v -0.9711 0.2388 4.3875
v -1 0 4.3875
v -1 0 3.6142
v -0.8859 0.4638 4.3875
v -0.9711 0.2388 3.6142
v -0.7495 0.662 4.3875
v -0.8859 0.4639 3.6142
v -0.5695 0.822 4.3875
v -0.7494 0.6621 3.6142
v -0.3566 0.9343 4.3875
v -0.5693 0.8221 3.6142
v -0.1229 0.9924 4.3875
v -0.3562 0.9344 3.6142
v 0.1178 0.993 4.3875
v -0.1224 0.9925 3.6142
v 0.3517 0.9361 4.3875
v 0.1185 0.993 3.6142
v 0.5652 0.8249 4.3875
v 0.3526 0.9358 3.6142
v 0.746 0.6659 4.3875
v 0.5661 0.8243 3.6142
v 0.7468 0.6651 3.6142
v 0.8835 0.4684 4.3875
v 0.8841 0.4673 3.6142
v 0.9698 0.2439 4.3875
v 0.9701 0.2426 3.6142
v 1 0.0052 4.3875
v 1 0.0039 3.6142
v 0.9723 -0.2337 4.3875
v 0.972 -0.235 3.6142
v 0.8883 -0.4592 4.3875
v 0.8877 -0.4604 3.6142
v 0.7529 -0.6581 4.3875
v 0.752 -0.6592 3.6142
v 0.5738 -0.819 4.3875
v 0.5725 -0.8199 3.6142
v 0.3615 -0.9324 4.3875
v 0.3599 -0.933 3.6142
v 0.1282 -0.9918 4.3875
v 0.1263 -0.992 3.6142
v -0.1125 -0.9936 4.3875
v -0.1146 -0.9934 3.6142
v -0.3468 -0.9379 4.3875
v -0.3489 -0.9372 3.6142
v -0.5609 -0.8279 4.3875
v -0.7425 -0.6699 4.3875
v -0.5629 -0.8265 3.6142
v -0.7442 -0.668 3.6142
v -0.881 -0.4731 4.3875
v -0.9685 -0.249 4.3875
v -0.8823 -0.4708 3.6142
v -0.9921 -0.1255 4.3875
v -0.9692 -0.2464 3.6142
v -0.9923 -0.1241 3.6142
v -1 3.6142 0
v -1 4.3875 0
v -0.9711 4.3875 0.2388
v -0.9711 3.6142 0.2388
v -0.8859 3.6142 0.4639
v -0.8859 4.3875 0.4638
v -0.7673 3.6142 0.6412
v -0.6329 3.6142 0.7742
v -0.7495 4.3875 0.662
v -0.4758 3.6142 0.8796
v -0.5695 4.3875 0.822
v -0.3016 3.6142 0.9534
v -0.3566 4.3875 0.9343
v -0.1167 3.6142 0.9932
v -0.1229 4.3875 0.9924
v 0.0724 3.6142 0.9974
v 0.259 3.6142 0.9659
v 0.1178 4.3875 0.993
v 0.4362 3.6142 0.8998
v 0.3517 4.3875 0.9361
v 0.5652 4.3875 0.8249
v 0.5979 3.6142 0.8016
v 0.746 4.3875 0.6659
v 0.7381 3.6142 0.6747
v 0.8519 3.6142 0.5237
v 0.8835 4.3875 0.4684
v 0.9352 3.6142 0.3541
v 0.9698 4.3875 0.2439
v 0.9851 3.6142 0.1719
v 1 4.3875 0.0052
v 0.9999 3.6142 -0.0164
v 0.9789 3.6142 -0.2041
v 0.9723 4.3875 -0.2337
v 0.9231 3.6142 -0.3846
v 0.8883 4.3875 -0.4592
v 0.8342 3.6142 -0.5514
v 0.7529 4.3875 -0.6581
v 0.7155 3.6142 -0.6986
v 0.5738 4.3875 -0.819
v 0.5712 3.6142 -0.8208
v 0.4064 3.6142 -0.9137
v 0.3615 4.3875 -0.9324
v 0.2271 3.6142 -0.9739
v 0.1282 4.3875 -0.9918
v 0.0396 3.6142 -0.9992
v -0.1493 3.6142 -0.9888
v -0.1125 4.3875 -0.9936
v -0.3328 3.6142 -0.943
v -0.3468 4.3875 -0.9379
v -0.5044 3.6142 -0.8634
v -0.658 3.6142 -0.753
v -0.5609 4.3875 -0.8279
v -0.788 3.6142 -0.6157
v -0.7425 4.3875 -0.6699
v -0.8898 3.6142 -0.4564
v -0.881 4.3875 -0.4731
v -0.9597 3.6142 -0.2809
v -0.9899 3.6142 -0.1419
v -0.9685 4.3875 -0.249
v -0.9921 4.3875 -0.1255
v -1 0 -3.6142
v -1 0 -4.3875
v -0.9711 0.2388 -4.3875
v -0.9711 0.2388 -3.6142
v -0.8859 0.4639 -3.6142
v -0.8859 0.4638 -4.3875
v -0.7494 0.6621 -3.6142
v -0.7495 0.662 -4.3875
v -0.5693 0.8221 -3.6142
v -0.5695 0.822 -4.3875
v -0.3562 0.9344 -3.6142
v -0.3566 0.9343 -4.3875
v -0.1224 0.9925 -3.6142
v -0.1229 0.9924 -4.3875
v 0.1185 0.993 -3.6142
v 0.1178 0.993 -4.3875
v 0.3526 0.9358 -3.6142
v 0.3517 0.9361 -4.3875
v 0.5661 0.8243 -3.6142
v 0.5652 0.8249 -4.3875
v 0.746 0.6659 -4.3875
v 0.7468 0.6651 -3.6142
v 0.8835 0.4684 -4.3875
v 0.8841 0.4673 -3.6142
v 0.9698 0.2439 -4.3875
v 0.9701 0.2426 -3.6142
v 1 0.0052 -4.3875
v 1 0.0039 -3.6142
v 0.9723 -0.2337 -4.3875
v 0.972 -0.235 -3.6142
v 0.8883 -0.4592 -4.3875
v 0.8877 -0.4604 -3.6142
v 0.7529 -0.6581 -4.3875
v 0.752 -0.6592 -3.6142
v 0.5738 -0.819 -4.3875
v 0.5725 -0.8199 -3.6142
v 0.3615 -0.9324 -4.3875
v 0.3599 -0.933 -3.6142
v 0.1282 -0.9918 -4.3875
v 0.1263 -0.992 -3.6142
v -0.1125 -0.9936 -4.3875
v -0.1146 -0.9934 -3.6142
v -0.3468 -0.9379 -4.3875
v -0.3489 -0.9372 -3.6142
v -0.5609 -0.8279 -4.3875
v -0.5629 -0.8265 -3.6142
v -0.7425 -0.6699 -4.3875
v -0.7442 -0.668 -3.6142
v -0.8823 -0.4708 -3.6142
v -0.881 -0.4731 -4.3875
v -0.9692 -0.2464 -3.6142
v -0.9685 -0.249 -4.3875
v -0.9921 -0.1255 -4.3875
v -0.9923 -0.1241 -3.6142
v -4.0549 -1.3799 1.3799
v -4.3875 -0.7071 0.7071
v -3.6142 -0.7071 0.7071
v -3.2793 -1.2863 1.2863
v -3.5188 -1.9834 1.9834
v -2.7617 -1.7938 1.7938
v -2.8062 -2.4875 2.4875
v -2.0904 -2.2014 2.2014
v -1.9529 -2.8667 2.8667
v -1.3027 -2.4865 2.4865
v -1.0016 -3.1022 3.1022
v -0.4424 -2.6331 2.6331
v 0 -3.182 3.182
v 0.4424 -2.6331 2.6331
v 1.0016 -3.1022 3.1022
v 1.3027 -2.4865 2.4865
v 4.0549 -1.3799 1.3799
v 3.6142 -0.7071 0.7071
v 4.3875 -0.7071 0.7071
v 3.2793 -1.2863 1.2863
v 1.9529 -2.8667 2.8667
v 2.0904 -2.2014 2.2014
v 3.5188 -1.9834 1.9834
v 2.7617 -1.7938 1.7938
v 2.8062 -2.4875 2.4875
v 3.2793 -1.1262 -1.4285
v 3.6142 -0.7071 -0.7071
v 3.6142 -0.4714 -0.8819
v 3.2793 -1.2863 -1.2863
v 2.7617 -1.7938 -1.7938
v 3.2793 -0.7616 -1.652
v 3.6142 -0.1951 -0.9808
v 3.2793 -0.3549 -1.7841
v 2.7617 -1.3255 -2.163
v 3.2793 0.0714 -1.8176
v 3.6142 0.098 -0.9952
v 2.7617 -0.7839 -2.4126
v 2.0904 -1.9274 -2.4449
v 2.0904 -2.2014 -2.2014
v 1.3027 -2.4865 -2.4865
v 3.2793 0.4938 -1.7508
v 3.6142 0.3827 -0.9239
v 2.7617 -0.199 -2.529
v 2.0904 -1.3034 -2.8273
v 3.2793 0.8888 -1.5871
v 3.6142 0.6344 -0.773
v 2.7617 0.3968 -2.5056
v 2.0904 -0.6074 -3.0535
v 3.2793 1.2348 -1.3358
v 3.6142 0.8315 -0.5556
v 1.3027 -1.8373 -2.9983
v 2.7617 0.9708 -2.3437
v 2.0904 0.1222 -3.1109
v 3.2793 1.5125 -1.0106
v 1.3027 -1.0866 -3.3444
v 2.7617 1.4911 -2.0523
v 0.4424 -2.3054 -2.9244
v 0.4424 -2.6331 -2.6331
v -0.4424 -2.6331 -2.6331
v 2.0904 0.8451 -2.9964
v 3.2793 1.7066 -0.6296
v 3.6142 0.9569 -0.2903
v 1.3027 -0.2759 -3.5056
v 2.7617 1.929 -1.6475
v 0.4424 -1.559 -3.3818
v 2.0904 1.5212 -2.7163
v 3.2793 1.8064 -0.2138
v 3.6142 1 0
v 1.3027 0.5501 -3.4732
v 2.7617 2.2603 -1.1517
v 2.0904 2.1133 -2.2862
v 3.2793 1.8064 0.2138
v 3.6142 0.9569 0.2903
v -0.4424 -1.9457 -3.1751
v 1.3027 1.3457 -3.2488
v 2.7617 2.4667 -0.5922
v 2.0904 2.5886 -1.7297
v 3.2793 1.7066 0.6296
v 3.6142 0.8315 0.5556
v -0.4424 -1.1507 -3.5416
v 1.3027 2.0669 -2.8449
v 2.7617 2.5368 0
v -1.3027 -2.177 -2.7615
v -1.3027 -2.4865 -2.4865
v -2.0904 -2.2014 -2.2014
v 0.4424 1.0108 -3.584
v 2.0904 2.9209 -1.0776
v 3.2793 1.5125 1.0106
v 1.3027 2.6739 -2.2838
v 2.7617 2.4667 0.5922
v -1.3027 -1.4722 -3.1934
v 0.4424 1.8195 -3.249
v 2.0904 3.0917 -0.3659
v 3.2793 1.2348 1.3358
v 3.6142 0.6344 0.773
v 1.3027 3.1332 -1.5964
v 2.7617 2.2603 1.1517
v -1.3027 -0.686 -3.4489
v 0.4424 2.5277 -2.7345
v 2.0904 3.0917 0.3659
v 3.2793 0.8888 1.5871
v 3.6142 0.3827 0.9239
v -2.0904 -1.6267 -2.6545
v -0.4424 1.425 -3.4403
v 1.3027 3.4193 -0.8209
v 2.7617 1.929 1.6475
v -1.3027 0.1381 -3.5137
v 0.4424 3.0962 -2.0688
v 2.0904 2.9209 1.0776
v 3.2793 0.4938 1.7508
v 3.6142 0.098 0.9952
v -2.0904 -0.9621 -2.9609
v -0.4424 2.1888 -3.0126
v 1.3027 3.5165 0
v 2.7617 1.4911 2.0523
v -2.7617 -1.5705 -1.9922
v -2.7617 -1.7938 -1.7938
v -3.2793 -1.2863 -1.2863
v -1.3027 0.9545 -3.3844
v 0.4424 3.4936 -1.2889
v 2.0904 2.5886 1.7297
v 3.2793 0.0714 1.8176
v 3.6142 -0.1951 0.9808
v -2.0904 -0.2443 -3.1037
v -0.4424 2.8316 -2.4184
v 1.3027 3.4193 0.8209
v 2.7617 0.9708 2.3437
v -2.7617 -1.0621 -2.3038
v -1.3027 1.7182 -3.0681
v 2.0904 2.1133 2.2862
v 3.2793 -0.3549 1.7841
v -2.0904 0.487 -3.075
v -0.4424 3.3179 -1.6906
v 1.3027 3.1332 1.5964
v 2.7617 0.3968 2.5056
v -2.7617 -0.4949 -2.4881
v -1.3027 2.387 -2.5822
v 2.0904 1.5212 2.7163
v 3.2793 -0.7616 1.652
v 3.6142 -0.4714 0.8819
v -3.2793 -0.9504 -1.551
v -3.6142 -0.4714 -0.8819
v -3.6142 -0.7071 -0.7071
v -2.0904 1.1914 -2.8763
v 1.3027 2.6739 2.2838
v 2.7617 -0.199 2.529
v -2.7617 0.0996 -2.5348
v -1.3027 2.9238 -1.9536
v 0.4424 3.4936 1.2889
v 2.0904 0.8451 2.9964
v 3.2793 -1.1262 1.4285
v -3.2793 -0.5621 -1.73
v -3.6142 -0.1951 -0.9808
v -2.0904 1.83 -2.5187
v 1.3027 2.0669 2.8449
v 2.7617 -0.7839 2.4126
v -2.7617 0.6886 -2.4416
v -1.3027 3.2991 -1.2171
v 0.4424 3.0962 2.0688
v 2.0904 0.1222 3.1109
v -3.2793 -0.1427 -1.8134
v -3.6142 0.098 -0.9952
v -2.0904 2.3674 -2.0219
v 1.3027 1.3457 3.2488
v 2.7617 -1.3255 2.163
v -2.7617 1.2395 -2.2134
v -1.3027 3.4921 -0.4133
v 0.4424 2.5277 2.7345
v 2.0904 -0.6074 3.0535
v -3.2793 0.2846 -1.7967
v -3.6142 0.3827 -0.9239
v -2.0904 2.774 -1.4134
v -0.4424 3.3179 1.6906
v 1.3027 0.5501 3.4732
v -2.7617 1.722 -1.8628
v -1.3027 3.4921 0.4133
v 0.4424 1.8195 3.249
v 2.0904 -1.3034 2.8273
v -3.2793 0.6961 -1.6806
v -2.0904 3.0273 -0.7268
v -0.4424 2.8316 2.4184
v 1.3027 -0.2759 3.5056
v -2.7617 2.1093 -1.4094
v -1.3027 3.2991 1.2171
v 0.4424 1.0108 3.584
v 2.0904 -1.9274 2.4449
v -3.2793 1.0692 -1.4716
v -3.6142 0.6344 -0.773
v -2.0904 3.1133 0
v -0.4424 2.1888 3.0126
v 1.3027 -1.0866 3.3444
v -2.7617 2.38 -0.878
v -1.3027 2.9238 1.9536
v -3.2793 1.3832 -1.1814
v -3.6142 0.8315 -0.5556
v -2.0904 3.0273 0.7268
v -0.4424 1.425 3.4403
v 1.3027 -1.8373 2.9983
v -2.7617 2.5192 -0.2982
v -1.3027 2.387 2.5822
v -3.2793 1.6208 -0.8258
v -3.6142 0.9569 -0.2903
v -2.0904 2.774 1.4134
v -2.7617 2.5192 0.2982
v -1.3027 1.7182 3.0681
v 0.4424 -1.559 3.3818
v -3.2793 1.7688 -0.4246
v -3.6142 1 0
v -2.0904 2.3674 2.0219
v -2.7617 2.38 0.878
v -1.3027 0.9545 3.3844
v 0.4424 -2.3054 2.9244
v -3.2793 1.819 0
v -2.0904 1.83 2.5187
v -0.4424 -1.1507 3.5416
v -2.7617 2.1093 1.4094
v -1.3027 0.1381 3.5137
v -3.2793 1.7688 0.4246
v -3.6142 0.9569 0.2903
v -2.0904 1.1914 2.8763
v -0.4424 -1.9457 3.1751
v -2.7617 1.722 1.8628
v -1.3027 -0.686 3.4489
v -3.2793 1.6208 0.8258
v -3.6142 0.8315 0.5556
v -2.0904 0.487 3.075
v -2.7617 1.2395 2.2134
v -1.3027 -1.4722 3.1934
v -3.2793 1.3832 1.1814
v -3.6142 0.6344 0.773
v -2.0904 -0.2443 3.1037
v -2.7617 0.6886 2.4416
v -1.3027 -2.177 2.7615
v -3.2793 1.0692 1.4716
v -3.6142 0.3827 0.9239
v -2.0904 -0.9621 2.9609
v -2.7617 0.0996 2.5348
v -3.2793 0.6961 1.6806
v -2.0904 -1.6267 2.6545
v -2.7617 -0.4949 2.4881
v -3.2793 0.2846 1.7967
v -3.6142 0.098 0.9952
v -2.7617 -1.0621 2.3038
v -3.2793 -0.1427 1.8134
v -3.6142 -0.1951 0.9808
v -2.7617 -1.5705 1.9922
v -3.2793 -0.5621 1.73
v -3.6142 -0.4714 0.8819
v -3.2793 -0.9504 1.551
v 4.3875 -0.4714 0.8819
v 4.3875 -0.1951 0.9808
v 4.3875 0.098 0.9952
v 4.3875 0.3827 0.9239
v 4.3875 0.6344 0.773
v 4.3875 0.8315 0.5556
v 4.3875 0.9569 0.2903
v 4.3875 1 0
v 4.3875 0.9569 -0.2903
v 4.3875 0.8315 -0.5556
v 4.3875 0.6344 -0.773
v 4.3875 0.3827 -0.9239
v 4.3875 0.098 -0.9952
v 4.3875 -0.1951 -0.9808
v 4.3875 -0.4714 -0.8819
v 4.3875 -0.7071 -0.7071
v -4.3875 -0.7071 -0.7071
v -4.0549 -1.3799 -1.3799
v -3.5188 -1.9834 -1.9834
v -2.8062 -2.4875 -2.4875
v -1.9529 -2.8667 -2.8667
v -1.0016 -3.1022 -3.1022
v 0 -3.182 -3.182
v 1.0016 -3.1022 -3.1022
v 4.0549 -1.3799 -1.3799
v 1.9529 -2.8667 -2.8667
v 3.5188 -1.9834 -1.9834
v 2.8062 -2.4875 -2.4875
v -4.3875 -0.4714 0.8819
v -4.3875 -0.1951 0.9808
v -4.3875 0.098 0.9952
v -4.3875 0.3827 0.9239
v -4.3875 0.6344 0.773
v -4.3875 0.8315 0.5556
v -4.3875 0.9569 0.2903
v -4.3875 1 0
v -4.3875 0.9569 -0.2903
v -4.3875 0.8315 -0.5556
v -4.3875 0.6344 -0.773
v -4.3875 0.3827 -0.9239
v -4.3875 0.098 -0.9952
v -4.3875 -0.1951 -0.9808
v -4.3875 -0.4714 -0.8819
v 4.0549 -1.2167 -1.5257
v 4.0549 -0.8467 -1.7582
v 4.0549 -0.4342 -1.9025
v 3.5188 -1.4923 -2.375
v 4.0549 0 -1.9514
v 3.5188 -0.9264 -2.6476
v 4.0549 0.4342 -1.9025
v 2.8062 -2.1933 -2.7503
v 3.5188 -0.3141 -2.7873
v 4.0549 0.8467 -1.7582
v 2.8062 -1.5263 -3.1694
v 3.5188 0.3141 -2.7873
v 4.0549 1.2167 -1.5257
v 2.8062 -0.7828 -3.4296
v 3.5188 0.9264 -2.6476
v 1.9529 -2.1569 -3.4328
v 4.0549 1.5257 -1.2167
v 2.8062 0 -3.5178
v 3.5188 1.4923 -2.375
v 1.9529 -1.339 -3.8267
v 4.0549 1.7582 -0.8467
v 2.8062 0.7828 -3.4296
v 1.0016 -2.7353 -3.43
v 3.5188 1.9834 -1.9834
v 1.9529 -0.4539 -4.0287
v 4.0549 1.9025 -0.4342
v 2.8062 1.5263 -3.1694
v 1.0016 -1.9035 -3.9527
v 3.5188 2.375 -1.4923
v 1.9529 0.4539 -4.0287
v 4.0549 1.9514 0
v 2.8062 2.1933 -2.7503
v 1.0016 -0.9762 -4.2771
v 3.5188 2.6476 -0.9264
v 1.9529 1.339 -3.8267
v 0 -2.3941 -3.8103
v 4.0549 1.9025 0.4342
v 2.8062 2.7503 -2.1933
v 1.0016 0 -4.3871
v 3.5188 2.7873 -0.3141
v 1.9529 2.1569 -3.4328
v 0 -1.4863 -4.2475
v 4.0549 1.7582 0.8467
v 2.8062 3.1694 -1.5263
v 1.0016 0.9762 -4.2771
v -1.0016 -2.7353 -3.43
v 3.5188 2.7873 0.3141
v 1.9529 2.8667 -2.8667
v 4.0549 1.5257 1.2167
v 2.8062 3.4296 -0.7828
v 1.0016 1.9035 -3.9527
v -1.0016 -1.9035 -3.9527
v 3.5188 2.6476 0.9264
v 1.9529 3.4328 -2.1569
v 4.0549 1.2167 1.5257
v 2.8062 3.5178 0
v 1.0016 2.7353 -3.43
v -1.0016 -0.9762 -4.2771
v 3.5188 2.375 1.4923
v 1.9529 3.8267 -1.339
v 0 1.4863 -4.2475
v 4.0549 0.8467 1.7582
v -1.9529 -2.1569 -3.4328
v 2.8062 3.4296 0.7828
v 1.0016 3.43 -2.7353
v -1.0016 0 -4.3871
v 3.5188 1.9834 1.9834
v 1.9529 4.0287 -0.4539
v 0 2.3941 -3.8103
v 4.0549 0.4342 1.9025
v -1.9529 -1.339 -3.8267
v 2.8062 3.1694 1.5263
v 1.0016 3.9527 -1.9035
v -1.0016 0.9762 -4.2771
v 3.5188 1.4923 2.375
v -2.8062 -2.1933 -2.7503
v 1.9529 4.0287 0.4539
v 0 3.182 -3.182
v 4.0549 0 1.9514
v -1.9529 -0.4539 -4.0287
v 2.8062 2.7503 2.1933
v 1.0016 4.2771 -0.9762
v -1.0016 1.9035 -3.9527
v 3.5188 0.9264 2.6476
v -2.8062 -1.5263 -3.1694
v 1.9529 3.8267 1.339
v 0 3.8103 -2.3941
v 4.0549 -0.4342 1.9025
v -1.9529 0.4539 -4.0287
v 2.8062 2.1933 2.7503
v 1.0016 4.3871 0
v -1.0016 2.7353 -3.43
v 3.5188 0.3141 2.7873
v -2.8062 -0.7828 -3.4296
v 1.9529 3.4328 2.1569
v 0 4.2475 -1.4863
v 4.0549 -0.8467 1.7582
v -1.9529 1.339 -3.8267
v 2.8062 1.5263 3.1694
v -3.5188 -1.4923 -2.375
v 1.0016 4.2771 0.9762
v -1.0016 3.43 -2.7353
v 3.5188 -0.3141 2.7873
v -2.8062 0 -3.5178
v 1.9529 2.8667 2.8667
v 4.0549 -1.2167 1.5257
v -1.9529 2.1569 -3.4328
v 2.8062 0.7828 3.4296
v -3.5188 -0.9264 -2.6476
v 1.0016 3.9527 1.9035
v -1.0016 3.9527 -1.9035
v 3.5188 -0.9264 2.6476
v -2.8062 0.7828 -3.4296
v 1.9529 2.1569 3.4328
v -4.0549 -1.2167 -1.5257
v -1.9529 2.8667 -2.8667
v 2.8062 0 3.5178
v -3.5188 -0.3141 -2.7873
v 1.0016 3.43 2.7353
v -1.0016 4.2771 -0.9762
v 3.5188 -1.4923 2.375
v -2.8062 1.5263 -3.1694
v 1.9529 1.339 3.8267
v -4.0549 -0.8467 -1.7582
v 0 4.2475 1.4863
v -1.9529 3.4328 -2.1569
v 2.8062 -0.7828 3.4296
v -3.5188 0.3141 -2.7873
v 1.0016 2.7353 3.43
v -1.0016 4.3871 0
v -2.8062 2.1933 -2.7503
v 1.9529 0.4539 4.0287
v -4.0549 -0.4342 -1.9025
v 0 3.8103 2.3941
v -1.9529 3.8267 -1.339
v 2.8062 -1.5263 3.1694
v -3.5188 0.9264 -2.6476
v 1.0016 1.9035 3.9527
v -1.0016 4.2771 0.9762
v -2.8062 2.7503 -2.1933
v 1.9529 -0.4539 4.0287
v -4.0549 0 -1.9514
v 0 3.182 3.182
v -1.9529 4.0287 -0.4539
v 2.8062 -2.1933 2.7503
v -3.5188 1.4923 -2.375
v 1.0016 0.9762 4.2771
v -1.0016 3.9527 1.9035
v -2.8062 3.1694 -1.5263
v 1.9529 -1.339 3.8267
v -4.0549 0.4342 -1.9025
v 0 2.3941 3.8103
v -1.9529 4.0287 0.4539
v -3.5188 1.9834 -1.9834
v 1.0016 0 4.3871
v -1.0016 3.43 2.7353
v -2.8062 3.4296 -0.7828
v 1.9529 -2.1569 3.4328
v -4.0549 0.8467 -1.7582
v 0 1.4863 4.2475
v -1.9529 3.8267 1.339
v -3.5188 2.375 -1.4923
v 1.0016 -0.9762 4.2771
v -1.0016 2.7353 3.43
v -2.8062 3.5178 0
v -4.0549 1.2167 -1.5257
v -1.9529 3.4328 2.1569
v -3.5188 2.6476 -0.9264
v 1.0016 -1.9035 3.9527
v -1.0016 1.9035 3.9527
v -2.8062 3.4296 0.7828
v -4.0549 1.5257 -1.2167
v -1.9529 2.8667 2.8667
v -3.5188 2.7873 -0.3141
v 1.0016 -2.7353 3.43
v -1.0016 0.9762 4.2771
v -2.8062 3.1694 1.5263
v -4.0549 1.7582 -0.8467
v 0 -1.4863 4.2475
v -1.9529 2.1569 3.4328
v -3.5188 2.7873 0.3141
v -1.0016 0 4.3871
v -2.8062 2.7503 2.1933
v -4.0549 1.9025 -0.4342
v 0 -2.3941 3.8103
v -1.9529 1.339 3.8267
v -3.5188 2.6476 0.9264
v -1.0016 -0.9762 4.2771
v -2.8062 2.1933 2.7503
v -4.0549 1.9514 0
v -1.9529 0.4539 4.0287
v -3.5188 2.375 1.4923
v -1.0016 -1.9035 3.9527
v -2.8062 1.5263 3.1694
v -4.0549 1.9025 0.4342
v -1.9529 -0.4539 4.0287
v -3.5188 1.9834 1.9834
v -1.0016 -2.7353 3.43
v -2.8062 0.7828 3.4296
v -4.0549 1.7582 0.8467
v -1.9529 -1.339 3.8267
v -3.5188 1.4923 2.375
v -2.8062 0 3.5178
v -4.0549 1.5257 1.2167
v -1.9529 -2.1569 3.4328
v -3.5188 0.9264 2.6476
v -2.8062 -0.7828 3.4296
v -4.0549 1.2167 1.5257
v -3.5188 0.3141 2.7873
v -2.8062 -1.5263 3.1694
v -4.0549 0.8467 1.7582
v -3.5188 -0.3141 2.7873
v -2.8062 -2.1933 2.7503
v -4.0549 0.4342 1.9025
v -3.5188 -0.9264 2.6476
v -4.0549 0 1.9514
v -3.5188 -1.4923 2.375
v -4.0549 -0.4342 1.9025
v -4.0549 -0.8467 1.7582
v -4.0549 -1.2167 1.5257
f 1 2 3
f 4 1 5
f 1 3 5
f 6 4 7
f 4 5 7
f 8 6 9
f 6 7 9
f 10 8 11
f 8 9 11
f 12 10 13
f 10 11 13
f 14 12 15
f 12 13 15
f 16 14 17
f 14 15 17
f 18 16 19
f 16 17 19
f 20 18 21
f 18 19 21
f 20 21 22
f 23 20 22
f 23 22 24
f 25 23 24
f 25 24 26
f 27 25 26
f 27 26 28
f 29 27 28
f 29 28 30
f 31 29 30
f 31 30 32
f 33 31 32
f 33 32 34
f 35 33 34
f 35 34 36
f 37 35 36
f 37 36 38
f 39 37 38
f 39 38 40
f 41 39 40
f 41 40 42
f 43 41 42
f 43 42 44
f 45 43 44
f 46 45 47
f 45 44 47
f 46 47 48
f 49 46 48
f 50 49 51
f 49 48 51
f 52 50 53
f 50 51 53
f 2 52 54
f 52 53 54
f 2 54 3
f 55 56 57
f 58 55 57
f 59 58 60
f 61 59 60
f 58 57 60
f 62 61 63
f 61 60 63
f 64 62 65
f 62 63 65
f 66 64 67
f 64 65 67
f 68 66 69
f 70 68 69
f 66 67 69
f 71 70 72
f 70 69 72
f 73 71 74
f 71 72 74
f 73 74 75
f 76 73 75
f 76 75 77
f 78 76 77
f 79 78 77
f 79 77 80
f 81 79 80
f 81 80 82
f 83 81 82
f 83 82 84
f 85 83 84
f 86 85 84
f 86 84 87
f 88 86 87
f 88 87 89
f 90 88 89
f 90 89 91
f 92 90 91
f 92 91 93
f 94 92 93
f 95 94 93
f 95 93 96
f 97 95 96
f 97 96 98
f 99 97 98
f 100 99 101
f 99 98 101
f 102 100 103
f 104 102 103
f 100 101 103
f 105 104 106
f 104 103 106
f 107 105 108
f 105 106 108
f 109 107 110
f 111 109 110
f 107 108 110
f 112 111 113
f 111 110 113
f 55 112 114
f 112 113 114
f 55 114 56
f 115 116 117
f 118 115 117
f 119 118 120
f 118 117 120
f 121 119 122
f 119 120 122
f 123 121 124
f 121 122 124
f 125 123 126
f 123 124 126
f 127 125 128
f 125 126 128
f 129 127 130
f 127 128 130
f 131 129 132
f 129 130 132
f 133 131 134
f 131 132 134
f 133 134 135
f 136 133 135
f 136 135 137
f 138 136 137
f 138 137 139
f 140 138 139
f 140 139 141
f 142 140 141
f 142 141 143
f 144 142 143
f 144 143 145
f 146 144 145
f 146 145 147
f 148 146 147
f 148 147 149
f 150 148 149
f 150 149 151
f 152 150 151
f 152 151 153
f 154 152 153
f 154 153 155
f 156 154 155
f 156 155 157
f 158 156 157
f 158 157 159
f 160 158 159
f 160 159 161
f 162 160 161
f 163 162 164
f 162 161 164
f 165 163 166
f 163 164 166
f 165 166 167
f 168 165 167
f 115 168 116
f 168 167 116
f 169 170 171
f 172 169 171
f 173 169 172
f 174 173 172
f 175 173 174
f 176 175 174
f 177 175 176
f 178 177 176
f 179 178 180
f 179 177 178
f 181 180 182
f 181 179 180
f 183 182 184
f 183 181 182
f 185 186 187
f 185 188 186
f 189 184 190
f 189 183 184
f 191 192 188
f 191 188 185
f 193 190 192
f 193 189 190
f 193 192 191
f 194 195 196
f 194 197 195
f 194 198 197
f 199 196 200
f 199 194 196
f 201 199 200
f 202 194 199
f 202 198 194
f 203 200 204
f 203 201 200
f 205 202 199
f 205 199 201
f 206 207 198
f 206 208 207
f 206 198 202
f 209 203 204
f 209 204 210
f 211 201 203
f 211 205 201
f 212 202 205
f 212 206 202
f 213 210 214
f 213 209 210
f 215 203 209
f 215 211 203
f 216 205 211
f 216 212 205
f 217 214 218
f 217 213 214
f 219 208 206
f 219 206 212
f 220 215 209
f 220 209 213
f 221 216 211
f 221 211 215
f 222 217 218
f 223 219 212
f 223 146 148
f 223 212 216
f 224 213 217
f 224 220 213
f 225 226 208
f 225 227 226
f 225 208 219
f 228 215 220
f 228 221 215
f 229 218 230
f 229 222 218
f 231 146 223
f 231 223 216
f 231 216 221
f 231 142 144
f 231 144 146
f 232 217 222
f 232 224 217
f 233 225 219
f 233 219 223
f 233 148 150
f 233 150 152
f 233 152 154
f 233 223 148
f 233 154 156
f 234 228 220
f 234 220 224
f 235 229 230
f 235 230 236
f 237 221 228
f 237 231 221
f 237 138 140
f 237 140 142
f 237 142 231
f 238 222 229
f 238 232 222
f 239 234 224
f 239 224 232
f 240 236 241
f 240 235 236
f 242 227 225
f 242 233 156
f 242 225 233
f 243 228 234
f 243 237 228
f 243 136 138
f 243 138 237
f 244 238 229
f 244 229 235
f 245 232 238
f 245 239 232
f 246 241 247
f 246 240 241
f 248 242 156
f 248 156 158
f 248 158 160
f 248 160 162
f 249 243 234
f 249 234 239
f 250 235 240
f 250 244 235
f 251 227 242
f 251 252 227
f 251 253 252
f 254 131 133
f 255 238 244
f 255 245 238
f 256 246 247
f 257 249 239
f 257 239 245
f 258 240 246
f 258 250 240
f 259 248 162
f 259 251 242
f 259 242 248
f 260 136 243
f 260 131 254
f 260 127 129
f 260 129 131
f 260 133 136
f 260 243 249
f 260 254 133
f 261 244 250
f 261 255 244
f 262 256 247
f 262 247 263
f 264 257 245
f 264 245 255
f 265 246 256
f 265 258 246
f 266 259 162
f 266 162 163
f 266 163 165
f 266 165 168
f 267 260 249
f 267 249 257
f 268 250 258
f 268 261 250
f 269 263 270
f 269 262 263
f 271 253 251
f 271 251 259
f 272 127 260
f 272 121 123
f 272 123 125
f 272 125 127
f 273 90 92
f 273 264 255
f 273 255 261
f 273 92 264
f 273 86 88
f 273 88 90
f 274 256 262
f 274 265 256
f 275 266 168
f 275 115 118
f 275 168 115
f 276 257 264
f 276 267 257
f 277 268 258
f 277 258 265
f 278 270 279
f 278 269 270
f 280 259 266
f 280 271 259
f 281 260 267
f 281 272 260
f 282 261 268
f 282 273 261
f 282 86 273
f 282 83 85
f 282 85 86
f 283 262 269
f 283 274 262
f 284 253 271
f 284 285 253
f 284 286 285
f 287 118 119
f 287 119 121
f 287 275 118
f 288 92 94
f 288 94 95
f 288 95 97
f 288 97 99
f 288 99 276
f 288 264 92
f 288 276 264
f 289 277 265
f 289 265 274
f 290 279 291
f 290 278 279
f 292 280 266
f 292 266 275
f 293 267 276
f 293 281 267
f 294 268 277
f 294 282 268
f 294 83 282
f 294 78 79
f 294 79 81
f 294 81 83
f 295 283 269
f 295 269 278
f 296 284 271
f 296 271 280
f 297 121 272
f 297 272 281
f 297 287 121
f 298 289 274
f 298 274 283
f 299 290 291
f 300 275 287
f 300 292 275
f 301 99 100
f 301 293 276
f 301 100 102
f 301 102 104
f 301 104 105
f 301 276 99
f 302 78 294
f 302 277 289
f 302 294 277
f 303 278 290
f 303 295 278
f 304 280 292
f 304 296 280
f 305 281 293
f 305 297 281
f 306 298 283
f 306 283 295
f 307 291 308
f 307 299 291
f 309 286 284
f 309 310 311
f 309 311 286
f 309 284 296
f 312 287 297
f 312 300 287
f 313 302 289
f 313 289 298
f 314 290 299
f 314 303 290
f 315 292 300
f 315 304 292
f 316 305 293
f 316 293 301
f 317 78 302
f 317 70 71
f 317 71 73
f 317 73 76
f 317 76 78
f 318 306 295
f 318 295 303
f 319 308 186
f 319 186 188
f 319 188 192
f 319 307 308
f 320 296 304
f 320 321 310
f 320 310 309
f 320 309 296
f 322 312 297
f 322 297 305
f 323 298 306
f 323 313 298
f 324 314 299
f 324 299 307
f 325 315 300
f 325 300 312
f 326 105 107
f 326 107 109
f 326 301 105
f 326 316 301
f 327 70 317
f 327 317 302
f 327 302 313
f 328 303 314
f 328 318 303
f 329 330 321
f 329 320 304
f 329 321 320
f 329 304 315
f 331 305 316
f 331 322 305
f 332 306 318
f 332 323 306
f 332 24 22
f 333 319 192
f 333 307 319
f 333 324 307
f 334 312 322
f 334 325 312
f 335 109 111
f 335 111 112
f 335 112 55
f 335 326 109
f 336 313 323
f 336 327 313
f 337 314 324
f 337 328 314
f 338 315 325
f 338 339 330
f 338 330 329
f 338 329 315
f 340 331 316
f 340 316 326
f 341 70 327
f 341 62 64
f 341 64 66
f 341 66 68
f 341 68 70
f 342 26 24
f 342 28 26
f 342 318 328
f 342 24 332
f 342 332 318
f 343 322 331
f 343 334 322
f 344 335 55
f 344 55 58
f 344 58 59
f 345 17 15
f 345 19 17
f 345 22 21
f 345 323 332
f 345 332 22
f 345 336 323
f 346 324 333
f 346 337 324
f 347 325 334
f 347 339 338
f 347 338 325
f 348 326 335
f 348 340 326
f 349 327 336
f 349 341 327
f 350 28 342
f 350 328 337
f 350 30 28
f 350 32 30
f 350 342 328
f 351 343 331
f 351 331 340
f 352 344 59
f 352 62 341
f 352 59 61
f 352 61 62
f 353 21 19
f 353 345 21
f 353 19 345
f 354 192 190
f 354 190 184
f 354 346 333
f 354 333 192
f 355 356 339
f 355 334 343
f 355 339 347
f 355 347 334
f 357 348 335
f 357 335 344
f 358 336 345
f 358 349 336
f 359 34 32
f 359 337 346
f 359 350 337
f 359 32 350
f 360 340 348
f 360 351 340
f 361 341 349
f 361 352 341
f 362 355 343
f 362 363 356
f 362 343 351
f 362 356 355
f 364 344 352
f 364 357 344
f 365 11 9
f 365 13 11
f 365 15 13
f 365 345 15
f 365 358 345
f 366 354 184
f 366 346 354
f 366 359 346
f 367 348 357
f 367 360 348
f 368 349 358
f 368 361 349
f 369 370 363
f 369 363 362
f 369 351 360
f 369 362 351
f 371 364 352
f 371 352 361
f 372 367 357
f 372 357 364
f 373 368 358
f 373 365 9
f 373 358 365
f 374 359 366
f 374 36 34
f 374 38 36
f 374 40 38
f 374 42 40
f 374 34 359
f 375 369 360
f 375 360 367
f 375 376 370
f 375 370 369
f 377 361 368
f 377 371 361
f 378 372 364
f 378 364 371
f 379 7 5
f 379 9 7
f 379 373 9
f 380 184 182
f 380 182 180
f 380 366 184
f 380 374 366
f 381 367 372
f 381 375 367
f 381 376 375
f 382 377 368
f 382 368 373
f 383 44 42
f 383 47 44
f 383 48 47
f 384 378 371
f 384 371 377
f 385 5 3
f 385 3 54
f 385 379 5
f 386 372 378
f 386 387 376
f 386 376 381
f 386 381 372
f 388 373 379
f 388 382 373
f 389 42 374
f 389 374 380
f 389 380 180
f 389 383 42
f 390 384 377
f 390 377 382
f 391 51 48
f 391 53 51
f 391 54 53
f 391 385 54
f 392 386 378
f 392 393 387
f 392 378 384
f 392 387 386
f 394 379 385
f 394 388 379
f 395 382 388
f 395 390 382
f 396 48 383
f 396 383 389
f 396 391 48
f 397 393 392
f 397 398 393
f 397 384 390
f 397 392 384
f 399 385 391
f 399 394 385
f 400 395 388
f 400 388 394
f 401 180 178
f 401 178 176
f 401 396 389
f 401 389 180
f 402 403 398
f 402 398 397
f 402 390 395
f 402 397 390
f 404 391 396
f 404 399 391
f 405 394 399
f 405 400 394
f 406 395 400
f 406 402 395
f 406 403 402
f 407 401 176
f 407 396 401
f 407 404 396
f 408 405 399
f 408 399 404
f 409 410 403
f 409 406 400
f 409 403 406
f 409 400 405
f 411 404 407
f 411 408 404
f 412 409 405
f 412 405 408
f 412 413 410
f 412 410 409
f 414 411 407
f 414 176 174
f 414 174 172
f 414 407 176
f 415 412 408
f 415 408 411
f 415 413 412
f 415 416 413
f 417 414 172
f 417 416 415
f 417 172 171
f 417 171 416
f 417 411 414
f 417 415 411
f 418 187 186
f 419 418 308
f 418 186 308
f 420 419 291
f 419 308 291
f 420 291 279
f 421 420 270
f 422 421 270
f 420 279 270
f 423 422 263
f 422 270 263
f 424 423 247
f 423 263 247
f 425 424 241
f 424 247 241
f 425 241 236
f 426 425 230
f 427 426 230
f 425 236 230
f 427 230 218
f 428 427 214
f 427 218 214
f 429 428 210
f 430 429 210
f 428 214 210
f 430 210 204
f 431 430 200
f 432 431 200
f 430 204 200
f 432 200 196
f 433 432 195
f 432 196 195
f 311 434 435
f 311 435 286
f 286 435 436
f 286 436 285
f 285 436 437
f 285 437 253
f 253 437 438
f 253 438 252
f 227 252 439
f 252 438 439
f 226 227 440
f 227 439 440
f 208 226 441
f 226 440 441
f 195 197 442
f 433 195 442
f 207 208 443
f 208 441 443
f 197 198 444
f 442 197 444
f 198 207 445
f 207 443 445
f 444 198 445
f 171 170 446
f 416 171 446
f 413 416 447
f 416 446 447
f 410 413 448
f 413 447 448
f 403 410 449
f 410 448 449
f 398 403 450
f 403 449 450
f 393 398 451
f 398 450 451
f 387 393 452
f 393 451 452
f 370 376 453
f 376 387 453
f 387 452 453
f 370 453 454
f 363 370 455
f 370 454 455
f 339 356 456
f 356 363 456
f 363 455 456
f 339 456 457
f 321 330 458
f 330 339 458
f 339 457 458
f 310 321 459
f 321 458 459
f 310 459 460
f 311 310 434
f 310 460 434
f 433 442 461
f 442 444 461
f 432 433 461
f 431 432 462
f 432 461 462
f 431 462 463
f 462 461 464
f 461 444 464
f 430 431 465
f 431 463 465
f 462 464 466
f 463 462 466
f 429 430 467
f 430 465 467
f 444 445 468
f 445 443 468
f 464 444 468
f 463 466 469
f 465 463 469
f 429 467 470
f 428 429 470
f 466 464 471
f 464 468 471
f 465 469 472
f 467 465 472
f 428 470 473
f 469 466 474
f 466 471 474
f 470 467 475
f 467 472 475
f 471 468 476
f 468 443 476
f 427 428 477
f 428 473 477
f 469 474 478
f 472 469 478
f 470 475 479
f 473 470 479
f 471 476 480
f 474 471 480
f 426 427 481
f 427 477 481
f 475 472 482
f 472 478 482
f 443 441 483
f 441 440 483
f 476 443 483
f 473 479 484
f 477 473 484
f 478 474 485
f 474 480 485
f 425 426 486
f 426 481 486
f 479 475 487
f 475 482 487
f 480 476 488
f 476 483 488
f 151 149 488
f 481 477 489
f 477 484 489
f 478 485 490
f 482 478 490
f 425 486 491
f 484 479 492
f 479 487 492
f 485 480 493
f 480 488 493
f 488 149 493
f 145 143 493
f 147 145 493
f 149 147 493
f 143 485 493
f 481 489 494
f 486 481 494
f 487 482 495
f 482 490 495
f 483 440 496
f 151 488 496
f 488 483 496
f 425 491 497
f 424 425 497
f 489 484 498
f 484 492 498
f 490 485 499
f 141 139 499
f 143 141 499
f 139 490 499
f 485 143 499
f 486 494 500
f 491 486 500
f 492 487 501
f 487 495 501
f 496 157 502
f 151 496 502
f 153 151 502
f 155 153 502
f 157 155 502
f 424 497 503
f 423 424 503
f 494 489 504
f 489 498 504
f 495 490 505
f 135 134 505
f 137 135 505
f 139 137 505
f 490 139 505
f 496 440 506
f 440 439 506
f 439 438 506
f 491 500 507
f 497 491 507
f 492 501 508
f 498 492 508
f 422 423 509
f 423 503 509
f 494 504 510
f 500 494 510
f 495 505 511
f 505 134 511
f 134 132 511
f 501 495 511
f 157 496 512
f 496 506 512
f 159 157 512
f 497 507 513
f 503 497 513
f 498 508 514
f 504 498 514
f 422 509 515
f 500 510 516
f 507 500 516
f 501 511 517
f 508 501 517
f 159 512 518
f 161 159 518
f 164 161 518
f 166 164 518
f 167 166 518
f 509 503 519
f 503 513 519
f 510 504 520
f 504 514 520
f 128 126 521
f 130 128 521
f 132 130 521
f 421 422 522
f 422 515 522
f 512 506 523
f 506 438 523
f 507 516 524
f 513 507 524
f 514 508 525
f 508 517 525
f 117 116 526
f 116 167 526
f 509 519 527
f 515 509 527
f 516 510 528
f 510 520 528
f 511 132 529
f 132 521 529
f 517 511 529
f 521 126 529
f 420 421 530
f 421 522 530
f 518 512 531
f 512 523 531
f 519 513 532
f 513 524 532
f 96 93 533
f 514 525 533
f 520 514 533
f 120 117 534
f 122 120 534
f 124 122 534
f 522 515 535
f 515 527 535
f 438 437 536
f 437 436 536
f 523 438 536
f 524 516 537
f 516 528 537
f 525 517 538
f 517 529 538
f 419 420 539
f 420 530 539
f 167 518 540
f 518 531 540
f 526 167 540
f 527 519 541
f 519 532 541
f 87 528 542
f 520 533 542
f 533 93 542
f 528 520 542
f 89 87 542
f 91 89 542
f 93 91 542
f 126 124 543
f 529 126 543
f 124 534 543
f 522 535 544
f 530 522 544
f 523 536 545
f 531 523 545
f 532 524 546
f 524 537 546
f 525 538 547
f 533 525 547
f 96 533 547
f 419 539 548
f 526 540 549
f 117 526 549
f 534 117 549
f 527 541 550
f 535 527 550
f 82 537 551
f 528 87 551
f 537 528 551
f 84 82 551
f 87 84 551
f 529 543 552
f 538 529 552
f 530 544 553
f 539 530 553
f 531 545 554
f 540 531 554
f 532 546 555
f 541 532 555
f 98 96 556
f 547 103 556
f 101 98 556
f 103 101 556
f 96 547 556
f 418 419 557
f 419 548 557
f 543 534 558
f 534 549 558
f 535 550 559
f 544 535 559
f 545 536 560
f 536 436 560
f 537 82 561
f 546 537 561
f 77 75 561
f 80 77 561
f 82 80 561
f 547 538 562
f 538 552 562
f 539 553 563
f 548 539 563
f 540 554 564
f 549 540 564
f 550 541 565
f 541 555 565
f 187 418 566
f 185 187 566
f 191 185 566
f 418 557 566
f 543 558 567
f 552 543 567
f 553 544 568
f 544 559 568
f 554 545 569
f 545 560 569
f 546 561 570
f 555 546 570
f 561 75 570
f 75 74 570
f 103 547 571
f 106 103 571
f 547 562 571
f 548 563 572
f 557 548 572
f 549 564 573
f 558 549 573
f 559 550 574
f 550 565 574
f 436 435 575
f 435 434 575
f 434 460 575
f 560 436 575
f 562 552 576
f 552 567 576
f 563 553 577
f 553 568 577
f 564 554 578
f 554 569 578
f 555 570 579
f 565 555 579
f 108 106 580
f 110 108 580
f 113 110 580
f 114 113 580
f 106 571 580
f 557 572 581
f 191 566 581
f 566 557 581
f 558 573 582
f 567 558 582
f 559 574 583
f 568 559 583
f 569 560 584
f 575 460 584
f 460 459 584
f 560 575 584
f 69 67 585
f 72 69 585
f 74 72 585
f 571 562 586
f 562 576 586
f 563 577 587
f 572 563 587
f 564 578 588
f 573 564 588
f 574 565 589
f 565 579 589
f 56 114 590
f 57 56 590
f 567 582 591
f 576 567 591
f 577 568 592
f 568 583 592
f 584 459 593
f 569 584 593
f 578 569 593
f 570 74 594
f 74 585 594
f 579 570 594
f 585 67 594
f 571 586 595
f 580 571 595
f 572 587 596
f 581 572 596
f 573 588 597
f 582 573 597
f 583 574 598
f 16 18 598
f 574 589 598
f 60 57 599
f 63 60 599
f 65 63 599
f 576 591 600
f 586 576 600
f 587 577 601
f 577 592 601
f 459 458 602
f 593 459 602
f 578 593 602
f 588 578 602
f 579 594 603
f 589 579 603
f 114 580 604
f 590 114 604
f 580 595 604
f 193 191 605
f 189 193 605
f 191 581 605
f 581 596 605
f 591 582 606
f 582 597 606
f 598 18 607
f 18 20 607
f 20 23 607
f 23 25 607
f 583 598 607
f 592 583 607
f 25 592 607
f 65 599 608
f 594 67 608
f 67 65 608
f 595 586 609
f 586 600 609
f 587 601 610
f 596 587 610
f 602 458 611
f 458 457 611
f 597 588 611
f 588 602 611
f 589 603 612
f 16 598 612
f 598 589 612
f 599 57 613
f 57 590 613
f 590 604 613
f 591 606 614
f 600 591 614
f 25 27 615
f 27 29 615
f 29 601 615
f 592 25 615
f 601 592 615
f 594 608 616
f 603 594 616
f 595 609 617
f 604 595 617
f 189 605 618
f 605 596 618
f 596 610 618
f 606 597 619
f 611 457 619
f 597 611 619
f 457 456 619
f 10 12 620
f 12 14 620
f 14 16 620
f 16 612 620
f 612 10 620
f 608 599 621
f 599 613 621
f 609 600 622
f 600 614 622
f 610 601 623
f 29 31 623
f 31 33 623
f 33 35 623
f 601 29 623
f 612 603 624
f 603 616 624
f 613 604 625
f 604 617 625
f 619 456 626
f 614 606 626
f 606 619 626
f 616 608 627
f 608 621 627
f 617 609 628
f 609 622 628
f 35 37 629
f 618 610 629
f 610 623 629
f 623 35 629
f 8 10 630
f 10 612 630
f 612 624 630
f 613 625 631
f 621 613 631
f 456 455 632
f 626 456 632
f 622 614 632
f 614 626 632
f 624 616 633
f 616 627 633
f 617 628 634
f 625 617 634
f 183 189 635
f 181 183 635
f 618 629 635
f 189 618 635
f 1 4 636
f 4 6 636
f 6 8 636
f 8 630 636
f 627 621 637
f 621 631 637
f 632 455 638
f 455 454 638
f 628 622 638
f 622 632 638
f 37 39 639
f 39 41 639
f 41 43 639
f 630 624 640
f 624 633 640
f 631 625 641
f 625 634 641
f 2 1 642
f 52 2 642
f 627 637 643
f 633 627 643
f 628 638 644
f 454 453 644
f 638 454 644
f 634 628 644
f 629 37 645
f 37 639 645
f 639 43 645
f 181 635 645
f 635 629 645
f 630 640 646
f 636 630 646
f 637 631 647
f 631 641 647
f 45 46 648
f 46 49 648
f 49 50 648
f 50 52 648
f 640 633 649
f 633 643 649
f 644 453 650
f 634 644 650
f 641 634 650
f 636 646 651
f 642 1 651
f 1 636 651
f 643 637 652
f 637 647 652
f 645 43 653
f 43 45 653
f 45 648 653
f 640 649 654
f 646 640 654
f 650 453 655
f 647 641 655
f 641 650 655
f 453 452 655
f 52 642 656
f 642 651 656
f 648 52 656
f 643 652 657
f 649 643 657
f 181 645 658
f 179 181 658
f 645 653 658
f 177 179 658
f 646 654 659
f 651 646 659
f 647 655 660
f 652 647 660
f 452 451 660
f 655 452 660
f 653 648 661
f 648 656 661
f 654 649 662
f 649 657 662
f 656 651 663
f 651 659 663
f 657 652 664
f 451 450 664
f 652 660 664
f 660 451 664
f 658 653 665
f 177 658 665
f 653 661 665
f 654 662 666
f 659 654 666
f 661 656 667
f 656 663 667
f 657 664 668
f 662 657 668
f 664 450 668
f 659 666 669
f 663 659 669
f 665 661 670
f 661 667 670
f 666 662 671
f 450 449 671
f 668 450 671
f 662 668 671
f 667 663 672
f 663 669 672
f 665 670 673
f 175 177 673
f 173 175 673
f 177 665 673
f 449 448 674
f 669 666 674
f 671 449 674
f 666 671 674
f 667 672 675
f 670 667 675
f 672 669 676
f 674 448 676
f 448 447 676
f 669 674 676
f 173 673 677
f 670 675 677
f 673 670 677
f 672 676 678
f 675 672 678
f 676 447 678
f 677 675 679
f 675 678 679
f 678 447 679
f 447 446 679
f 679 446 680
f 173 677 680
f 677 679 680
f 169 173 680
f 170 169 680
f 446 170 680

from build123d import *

# Parameters (mm, degrees)
F1_ANGLE = 270
F14_T    = -0.75
F3_D     = 2
F5_D     = 2
F7_ANGLE = 135
F9_D     = 2
F11_D    = 2
F13_D    = 2


with BuildPart() as f1:
    # F0 (on Top) → F1 (revolve)
    with BuildSketch(Plane.XY):
        with BuildLine():
            ThreePointArc((4.5, 0), (0, 4.5), (-4.5, 0))
            Line((-4.5, 0), (4.5, 0))
        make_face()
    revolve(axis=Axis((0.171331, 0, 0), (1, 0, 0)), revolution_arc=F1_ANGLE)

    # F14
    f14_openings = [f1.faces().sort_by_distance(p)[0] for p in [
        (0, 1.909859, 0),
        (0, 0, -1.909859),
    ]]
    offset(amount=F14_T, openings=f14_openings)

    # F3 (through all)
    with Locations(Plane.YZ):
        with Locations((0, 0)):
            Hole(F3_D / 2)

    # F5 (through all)
    with Locations(Plane(origin=(0, 0, 0), x_dir=(0, 1, 0), z_dir=(-1, 0, 0))):
        with Locations((0, 0)):
            Hole(F5_D / 2)


with BuildPart() as f1_1:
    # F7: moved
    add(f1.part.rotate(Axis((0, 0, 0), (-1, 0, 0)), F7_ANGLE))

    # F9 (through all)
    with Locations(Plane.XZ):
        with Locations((0, 0)):
            Hole(F9_D / 2)

    # F11 (through all)
    with Locations(Plane.XY):
        with Locations((0, 0)):
            Hole(F11_D / 2)

    # F13 (through all)
    with Locations(Plane(origin=(0, 0, 0), x_dir=(1, 0, 0), z_dir=(0, 0, -1))):
        with Locations((0, 0)):
            Hole(F13_D / 2)


solid = f1_1.part
